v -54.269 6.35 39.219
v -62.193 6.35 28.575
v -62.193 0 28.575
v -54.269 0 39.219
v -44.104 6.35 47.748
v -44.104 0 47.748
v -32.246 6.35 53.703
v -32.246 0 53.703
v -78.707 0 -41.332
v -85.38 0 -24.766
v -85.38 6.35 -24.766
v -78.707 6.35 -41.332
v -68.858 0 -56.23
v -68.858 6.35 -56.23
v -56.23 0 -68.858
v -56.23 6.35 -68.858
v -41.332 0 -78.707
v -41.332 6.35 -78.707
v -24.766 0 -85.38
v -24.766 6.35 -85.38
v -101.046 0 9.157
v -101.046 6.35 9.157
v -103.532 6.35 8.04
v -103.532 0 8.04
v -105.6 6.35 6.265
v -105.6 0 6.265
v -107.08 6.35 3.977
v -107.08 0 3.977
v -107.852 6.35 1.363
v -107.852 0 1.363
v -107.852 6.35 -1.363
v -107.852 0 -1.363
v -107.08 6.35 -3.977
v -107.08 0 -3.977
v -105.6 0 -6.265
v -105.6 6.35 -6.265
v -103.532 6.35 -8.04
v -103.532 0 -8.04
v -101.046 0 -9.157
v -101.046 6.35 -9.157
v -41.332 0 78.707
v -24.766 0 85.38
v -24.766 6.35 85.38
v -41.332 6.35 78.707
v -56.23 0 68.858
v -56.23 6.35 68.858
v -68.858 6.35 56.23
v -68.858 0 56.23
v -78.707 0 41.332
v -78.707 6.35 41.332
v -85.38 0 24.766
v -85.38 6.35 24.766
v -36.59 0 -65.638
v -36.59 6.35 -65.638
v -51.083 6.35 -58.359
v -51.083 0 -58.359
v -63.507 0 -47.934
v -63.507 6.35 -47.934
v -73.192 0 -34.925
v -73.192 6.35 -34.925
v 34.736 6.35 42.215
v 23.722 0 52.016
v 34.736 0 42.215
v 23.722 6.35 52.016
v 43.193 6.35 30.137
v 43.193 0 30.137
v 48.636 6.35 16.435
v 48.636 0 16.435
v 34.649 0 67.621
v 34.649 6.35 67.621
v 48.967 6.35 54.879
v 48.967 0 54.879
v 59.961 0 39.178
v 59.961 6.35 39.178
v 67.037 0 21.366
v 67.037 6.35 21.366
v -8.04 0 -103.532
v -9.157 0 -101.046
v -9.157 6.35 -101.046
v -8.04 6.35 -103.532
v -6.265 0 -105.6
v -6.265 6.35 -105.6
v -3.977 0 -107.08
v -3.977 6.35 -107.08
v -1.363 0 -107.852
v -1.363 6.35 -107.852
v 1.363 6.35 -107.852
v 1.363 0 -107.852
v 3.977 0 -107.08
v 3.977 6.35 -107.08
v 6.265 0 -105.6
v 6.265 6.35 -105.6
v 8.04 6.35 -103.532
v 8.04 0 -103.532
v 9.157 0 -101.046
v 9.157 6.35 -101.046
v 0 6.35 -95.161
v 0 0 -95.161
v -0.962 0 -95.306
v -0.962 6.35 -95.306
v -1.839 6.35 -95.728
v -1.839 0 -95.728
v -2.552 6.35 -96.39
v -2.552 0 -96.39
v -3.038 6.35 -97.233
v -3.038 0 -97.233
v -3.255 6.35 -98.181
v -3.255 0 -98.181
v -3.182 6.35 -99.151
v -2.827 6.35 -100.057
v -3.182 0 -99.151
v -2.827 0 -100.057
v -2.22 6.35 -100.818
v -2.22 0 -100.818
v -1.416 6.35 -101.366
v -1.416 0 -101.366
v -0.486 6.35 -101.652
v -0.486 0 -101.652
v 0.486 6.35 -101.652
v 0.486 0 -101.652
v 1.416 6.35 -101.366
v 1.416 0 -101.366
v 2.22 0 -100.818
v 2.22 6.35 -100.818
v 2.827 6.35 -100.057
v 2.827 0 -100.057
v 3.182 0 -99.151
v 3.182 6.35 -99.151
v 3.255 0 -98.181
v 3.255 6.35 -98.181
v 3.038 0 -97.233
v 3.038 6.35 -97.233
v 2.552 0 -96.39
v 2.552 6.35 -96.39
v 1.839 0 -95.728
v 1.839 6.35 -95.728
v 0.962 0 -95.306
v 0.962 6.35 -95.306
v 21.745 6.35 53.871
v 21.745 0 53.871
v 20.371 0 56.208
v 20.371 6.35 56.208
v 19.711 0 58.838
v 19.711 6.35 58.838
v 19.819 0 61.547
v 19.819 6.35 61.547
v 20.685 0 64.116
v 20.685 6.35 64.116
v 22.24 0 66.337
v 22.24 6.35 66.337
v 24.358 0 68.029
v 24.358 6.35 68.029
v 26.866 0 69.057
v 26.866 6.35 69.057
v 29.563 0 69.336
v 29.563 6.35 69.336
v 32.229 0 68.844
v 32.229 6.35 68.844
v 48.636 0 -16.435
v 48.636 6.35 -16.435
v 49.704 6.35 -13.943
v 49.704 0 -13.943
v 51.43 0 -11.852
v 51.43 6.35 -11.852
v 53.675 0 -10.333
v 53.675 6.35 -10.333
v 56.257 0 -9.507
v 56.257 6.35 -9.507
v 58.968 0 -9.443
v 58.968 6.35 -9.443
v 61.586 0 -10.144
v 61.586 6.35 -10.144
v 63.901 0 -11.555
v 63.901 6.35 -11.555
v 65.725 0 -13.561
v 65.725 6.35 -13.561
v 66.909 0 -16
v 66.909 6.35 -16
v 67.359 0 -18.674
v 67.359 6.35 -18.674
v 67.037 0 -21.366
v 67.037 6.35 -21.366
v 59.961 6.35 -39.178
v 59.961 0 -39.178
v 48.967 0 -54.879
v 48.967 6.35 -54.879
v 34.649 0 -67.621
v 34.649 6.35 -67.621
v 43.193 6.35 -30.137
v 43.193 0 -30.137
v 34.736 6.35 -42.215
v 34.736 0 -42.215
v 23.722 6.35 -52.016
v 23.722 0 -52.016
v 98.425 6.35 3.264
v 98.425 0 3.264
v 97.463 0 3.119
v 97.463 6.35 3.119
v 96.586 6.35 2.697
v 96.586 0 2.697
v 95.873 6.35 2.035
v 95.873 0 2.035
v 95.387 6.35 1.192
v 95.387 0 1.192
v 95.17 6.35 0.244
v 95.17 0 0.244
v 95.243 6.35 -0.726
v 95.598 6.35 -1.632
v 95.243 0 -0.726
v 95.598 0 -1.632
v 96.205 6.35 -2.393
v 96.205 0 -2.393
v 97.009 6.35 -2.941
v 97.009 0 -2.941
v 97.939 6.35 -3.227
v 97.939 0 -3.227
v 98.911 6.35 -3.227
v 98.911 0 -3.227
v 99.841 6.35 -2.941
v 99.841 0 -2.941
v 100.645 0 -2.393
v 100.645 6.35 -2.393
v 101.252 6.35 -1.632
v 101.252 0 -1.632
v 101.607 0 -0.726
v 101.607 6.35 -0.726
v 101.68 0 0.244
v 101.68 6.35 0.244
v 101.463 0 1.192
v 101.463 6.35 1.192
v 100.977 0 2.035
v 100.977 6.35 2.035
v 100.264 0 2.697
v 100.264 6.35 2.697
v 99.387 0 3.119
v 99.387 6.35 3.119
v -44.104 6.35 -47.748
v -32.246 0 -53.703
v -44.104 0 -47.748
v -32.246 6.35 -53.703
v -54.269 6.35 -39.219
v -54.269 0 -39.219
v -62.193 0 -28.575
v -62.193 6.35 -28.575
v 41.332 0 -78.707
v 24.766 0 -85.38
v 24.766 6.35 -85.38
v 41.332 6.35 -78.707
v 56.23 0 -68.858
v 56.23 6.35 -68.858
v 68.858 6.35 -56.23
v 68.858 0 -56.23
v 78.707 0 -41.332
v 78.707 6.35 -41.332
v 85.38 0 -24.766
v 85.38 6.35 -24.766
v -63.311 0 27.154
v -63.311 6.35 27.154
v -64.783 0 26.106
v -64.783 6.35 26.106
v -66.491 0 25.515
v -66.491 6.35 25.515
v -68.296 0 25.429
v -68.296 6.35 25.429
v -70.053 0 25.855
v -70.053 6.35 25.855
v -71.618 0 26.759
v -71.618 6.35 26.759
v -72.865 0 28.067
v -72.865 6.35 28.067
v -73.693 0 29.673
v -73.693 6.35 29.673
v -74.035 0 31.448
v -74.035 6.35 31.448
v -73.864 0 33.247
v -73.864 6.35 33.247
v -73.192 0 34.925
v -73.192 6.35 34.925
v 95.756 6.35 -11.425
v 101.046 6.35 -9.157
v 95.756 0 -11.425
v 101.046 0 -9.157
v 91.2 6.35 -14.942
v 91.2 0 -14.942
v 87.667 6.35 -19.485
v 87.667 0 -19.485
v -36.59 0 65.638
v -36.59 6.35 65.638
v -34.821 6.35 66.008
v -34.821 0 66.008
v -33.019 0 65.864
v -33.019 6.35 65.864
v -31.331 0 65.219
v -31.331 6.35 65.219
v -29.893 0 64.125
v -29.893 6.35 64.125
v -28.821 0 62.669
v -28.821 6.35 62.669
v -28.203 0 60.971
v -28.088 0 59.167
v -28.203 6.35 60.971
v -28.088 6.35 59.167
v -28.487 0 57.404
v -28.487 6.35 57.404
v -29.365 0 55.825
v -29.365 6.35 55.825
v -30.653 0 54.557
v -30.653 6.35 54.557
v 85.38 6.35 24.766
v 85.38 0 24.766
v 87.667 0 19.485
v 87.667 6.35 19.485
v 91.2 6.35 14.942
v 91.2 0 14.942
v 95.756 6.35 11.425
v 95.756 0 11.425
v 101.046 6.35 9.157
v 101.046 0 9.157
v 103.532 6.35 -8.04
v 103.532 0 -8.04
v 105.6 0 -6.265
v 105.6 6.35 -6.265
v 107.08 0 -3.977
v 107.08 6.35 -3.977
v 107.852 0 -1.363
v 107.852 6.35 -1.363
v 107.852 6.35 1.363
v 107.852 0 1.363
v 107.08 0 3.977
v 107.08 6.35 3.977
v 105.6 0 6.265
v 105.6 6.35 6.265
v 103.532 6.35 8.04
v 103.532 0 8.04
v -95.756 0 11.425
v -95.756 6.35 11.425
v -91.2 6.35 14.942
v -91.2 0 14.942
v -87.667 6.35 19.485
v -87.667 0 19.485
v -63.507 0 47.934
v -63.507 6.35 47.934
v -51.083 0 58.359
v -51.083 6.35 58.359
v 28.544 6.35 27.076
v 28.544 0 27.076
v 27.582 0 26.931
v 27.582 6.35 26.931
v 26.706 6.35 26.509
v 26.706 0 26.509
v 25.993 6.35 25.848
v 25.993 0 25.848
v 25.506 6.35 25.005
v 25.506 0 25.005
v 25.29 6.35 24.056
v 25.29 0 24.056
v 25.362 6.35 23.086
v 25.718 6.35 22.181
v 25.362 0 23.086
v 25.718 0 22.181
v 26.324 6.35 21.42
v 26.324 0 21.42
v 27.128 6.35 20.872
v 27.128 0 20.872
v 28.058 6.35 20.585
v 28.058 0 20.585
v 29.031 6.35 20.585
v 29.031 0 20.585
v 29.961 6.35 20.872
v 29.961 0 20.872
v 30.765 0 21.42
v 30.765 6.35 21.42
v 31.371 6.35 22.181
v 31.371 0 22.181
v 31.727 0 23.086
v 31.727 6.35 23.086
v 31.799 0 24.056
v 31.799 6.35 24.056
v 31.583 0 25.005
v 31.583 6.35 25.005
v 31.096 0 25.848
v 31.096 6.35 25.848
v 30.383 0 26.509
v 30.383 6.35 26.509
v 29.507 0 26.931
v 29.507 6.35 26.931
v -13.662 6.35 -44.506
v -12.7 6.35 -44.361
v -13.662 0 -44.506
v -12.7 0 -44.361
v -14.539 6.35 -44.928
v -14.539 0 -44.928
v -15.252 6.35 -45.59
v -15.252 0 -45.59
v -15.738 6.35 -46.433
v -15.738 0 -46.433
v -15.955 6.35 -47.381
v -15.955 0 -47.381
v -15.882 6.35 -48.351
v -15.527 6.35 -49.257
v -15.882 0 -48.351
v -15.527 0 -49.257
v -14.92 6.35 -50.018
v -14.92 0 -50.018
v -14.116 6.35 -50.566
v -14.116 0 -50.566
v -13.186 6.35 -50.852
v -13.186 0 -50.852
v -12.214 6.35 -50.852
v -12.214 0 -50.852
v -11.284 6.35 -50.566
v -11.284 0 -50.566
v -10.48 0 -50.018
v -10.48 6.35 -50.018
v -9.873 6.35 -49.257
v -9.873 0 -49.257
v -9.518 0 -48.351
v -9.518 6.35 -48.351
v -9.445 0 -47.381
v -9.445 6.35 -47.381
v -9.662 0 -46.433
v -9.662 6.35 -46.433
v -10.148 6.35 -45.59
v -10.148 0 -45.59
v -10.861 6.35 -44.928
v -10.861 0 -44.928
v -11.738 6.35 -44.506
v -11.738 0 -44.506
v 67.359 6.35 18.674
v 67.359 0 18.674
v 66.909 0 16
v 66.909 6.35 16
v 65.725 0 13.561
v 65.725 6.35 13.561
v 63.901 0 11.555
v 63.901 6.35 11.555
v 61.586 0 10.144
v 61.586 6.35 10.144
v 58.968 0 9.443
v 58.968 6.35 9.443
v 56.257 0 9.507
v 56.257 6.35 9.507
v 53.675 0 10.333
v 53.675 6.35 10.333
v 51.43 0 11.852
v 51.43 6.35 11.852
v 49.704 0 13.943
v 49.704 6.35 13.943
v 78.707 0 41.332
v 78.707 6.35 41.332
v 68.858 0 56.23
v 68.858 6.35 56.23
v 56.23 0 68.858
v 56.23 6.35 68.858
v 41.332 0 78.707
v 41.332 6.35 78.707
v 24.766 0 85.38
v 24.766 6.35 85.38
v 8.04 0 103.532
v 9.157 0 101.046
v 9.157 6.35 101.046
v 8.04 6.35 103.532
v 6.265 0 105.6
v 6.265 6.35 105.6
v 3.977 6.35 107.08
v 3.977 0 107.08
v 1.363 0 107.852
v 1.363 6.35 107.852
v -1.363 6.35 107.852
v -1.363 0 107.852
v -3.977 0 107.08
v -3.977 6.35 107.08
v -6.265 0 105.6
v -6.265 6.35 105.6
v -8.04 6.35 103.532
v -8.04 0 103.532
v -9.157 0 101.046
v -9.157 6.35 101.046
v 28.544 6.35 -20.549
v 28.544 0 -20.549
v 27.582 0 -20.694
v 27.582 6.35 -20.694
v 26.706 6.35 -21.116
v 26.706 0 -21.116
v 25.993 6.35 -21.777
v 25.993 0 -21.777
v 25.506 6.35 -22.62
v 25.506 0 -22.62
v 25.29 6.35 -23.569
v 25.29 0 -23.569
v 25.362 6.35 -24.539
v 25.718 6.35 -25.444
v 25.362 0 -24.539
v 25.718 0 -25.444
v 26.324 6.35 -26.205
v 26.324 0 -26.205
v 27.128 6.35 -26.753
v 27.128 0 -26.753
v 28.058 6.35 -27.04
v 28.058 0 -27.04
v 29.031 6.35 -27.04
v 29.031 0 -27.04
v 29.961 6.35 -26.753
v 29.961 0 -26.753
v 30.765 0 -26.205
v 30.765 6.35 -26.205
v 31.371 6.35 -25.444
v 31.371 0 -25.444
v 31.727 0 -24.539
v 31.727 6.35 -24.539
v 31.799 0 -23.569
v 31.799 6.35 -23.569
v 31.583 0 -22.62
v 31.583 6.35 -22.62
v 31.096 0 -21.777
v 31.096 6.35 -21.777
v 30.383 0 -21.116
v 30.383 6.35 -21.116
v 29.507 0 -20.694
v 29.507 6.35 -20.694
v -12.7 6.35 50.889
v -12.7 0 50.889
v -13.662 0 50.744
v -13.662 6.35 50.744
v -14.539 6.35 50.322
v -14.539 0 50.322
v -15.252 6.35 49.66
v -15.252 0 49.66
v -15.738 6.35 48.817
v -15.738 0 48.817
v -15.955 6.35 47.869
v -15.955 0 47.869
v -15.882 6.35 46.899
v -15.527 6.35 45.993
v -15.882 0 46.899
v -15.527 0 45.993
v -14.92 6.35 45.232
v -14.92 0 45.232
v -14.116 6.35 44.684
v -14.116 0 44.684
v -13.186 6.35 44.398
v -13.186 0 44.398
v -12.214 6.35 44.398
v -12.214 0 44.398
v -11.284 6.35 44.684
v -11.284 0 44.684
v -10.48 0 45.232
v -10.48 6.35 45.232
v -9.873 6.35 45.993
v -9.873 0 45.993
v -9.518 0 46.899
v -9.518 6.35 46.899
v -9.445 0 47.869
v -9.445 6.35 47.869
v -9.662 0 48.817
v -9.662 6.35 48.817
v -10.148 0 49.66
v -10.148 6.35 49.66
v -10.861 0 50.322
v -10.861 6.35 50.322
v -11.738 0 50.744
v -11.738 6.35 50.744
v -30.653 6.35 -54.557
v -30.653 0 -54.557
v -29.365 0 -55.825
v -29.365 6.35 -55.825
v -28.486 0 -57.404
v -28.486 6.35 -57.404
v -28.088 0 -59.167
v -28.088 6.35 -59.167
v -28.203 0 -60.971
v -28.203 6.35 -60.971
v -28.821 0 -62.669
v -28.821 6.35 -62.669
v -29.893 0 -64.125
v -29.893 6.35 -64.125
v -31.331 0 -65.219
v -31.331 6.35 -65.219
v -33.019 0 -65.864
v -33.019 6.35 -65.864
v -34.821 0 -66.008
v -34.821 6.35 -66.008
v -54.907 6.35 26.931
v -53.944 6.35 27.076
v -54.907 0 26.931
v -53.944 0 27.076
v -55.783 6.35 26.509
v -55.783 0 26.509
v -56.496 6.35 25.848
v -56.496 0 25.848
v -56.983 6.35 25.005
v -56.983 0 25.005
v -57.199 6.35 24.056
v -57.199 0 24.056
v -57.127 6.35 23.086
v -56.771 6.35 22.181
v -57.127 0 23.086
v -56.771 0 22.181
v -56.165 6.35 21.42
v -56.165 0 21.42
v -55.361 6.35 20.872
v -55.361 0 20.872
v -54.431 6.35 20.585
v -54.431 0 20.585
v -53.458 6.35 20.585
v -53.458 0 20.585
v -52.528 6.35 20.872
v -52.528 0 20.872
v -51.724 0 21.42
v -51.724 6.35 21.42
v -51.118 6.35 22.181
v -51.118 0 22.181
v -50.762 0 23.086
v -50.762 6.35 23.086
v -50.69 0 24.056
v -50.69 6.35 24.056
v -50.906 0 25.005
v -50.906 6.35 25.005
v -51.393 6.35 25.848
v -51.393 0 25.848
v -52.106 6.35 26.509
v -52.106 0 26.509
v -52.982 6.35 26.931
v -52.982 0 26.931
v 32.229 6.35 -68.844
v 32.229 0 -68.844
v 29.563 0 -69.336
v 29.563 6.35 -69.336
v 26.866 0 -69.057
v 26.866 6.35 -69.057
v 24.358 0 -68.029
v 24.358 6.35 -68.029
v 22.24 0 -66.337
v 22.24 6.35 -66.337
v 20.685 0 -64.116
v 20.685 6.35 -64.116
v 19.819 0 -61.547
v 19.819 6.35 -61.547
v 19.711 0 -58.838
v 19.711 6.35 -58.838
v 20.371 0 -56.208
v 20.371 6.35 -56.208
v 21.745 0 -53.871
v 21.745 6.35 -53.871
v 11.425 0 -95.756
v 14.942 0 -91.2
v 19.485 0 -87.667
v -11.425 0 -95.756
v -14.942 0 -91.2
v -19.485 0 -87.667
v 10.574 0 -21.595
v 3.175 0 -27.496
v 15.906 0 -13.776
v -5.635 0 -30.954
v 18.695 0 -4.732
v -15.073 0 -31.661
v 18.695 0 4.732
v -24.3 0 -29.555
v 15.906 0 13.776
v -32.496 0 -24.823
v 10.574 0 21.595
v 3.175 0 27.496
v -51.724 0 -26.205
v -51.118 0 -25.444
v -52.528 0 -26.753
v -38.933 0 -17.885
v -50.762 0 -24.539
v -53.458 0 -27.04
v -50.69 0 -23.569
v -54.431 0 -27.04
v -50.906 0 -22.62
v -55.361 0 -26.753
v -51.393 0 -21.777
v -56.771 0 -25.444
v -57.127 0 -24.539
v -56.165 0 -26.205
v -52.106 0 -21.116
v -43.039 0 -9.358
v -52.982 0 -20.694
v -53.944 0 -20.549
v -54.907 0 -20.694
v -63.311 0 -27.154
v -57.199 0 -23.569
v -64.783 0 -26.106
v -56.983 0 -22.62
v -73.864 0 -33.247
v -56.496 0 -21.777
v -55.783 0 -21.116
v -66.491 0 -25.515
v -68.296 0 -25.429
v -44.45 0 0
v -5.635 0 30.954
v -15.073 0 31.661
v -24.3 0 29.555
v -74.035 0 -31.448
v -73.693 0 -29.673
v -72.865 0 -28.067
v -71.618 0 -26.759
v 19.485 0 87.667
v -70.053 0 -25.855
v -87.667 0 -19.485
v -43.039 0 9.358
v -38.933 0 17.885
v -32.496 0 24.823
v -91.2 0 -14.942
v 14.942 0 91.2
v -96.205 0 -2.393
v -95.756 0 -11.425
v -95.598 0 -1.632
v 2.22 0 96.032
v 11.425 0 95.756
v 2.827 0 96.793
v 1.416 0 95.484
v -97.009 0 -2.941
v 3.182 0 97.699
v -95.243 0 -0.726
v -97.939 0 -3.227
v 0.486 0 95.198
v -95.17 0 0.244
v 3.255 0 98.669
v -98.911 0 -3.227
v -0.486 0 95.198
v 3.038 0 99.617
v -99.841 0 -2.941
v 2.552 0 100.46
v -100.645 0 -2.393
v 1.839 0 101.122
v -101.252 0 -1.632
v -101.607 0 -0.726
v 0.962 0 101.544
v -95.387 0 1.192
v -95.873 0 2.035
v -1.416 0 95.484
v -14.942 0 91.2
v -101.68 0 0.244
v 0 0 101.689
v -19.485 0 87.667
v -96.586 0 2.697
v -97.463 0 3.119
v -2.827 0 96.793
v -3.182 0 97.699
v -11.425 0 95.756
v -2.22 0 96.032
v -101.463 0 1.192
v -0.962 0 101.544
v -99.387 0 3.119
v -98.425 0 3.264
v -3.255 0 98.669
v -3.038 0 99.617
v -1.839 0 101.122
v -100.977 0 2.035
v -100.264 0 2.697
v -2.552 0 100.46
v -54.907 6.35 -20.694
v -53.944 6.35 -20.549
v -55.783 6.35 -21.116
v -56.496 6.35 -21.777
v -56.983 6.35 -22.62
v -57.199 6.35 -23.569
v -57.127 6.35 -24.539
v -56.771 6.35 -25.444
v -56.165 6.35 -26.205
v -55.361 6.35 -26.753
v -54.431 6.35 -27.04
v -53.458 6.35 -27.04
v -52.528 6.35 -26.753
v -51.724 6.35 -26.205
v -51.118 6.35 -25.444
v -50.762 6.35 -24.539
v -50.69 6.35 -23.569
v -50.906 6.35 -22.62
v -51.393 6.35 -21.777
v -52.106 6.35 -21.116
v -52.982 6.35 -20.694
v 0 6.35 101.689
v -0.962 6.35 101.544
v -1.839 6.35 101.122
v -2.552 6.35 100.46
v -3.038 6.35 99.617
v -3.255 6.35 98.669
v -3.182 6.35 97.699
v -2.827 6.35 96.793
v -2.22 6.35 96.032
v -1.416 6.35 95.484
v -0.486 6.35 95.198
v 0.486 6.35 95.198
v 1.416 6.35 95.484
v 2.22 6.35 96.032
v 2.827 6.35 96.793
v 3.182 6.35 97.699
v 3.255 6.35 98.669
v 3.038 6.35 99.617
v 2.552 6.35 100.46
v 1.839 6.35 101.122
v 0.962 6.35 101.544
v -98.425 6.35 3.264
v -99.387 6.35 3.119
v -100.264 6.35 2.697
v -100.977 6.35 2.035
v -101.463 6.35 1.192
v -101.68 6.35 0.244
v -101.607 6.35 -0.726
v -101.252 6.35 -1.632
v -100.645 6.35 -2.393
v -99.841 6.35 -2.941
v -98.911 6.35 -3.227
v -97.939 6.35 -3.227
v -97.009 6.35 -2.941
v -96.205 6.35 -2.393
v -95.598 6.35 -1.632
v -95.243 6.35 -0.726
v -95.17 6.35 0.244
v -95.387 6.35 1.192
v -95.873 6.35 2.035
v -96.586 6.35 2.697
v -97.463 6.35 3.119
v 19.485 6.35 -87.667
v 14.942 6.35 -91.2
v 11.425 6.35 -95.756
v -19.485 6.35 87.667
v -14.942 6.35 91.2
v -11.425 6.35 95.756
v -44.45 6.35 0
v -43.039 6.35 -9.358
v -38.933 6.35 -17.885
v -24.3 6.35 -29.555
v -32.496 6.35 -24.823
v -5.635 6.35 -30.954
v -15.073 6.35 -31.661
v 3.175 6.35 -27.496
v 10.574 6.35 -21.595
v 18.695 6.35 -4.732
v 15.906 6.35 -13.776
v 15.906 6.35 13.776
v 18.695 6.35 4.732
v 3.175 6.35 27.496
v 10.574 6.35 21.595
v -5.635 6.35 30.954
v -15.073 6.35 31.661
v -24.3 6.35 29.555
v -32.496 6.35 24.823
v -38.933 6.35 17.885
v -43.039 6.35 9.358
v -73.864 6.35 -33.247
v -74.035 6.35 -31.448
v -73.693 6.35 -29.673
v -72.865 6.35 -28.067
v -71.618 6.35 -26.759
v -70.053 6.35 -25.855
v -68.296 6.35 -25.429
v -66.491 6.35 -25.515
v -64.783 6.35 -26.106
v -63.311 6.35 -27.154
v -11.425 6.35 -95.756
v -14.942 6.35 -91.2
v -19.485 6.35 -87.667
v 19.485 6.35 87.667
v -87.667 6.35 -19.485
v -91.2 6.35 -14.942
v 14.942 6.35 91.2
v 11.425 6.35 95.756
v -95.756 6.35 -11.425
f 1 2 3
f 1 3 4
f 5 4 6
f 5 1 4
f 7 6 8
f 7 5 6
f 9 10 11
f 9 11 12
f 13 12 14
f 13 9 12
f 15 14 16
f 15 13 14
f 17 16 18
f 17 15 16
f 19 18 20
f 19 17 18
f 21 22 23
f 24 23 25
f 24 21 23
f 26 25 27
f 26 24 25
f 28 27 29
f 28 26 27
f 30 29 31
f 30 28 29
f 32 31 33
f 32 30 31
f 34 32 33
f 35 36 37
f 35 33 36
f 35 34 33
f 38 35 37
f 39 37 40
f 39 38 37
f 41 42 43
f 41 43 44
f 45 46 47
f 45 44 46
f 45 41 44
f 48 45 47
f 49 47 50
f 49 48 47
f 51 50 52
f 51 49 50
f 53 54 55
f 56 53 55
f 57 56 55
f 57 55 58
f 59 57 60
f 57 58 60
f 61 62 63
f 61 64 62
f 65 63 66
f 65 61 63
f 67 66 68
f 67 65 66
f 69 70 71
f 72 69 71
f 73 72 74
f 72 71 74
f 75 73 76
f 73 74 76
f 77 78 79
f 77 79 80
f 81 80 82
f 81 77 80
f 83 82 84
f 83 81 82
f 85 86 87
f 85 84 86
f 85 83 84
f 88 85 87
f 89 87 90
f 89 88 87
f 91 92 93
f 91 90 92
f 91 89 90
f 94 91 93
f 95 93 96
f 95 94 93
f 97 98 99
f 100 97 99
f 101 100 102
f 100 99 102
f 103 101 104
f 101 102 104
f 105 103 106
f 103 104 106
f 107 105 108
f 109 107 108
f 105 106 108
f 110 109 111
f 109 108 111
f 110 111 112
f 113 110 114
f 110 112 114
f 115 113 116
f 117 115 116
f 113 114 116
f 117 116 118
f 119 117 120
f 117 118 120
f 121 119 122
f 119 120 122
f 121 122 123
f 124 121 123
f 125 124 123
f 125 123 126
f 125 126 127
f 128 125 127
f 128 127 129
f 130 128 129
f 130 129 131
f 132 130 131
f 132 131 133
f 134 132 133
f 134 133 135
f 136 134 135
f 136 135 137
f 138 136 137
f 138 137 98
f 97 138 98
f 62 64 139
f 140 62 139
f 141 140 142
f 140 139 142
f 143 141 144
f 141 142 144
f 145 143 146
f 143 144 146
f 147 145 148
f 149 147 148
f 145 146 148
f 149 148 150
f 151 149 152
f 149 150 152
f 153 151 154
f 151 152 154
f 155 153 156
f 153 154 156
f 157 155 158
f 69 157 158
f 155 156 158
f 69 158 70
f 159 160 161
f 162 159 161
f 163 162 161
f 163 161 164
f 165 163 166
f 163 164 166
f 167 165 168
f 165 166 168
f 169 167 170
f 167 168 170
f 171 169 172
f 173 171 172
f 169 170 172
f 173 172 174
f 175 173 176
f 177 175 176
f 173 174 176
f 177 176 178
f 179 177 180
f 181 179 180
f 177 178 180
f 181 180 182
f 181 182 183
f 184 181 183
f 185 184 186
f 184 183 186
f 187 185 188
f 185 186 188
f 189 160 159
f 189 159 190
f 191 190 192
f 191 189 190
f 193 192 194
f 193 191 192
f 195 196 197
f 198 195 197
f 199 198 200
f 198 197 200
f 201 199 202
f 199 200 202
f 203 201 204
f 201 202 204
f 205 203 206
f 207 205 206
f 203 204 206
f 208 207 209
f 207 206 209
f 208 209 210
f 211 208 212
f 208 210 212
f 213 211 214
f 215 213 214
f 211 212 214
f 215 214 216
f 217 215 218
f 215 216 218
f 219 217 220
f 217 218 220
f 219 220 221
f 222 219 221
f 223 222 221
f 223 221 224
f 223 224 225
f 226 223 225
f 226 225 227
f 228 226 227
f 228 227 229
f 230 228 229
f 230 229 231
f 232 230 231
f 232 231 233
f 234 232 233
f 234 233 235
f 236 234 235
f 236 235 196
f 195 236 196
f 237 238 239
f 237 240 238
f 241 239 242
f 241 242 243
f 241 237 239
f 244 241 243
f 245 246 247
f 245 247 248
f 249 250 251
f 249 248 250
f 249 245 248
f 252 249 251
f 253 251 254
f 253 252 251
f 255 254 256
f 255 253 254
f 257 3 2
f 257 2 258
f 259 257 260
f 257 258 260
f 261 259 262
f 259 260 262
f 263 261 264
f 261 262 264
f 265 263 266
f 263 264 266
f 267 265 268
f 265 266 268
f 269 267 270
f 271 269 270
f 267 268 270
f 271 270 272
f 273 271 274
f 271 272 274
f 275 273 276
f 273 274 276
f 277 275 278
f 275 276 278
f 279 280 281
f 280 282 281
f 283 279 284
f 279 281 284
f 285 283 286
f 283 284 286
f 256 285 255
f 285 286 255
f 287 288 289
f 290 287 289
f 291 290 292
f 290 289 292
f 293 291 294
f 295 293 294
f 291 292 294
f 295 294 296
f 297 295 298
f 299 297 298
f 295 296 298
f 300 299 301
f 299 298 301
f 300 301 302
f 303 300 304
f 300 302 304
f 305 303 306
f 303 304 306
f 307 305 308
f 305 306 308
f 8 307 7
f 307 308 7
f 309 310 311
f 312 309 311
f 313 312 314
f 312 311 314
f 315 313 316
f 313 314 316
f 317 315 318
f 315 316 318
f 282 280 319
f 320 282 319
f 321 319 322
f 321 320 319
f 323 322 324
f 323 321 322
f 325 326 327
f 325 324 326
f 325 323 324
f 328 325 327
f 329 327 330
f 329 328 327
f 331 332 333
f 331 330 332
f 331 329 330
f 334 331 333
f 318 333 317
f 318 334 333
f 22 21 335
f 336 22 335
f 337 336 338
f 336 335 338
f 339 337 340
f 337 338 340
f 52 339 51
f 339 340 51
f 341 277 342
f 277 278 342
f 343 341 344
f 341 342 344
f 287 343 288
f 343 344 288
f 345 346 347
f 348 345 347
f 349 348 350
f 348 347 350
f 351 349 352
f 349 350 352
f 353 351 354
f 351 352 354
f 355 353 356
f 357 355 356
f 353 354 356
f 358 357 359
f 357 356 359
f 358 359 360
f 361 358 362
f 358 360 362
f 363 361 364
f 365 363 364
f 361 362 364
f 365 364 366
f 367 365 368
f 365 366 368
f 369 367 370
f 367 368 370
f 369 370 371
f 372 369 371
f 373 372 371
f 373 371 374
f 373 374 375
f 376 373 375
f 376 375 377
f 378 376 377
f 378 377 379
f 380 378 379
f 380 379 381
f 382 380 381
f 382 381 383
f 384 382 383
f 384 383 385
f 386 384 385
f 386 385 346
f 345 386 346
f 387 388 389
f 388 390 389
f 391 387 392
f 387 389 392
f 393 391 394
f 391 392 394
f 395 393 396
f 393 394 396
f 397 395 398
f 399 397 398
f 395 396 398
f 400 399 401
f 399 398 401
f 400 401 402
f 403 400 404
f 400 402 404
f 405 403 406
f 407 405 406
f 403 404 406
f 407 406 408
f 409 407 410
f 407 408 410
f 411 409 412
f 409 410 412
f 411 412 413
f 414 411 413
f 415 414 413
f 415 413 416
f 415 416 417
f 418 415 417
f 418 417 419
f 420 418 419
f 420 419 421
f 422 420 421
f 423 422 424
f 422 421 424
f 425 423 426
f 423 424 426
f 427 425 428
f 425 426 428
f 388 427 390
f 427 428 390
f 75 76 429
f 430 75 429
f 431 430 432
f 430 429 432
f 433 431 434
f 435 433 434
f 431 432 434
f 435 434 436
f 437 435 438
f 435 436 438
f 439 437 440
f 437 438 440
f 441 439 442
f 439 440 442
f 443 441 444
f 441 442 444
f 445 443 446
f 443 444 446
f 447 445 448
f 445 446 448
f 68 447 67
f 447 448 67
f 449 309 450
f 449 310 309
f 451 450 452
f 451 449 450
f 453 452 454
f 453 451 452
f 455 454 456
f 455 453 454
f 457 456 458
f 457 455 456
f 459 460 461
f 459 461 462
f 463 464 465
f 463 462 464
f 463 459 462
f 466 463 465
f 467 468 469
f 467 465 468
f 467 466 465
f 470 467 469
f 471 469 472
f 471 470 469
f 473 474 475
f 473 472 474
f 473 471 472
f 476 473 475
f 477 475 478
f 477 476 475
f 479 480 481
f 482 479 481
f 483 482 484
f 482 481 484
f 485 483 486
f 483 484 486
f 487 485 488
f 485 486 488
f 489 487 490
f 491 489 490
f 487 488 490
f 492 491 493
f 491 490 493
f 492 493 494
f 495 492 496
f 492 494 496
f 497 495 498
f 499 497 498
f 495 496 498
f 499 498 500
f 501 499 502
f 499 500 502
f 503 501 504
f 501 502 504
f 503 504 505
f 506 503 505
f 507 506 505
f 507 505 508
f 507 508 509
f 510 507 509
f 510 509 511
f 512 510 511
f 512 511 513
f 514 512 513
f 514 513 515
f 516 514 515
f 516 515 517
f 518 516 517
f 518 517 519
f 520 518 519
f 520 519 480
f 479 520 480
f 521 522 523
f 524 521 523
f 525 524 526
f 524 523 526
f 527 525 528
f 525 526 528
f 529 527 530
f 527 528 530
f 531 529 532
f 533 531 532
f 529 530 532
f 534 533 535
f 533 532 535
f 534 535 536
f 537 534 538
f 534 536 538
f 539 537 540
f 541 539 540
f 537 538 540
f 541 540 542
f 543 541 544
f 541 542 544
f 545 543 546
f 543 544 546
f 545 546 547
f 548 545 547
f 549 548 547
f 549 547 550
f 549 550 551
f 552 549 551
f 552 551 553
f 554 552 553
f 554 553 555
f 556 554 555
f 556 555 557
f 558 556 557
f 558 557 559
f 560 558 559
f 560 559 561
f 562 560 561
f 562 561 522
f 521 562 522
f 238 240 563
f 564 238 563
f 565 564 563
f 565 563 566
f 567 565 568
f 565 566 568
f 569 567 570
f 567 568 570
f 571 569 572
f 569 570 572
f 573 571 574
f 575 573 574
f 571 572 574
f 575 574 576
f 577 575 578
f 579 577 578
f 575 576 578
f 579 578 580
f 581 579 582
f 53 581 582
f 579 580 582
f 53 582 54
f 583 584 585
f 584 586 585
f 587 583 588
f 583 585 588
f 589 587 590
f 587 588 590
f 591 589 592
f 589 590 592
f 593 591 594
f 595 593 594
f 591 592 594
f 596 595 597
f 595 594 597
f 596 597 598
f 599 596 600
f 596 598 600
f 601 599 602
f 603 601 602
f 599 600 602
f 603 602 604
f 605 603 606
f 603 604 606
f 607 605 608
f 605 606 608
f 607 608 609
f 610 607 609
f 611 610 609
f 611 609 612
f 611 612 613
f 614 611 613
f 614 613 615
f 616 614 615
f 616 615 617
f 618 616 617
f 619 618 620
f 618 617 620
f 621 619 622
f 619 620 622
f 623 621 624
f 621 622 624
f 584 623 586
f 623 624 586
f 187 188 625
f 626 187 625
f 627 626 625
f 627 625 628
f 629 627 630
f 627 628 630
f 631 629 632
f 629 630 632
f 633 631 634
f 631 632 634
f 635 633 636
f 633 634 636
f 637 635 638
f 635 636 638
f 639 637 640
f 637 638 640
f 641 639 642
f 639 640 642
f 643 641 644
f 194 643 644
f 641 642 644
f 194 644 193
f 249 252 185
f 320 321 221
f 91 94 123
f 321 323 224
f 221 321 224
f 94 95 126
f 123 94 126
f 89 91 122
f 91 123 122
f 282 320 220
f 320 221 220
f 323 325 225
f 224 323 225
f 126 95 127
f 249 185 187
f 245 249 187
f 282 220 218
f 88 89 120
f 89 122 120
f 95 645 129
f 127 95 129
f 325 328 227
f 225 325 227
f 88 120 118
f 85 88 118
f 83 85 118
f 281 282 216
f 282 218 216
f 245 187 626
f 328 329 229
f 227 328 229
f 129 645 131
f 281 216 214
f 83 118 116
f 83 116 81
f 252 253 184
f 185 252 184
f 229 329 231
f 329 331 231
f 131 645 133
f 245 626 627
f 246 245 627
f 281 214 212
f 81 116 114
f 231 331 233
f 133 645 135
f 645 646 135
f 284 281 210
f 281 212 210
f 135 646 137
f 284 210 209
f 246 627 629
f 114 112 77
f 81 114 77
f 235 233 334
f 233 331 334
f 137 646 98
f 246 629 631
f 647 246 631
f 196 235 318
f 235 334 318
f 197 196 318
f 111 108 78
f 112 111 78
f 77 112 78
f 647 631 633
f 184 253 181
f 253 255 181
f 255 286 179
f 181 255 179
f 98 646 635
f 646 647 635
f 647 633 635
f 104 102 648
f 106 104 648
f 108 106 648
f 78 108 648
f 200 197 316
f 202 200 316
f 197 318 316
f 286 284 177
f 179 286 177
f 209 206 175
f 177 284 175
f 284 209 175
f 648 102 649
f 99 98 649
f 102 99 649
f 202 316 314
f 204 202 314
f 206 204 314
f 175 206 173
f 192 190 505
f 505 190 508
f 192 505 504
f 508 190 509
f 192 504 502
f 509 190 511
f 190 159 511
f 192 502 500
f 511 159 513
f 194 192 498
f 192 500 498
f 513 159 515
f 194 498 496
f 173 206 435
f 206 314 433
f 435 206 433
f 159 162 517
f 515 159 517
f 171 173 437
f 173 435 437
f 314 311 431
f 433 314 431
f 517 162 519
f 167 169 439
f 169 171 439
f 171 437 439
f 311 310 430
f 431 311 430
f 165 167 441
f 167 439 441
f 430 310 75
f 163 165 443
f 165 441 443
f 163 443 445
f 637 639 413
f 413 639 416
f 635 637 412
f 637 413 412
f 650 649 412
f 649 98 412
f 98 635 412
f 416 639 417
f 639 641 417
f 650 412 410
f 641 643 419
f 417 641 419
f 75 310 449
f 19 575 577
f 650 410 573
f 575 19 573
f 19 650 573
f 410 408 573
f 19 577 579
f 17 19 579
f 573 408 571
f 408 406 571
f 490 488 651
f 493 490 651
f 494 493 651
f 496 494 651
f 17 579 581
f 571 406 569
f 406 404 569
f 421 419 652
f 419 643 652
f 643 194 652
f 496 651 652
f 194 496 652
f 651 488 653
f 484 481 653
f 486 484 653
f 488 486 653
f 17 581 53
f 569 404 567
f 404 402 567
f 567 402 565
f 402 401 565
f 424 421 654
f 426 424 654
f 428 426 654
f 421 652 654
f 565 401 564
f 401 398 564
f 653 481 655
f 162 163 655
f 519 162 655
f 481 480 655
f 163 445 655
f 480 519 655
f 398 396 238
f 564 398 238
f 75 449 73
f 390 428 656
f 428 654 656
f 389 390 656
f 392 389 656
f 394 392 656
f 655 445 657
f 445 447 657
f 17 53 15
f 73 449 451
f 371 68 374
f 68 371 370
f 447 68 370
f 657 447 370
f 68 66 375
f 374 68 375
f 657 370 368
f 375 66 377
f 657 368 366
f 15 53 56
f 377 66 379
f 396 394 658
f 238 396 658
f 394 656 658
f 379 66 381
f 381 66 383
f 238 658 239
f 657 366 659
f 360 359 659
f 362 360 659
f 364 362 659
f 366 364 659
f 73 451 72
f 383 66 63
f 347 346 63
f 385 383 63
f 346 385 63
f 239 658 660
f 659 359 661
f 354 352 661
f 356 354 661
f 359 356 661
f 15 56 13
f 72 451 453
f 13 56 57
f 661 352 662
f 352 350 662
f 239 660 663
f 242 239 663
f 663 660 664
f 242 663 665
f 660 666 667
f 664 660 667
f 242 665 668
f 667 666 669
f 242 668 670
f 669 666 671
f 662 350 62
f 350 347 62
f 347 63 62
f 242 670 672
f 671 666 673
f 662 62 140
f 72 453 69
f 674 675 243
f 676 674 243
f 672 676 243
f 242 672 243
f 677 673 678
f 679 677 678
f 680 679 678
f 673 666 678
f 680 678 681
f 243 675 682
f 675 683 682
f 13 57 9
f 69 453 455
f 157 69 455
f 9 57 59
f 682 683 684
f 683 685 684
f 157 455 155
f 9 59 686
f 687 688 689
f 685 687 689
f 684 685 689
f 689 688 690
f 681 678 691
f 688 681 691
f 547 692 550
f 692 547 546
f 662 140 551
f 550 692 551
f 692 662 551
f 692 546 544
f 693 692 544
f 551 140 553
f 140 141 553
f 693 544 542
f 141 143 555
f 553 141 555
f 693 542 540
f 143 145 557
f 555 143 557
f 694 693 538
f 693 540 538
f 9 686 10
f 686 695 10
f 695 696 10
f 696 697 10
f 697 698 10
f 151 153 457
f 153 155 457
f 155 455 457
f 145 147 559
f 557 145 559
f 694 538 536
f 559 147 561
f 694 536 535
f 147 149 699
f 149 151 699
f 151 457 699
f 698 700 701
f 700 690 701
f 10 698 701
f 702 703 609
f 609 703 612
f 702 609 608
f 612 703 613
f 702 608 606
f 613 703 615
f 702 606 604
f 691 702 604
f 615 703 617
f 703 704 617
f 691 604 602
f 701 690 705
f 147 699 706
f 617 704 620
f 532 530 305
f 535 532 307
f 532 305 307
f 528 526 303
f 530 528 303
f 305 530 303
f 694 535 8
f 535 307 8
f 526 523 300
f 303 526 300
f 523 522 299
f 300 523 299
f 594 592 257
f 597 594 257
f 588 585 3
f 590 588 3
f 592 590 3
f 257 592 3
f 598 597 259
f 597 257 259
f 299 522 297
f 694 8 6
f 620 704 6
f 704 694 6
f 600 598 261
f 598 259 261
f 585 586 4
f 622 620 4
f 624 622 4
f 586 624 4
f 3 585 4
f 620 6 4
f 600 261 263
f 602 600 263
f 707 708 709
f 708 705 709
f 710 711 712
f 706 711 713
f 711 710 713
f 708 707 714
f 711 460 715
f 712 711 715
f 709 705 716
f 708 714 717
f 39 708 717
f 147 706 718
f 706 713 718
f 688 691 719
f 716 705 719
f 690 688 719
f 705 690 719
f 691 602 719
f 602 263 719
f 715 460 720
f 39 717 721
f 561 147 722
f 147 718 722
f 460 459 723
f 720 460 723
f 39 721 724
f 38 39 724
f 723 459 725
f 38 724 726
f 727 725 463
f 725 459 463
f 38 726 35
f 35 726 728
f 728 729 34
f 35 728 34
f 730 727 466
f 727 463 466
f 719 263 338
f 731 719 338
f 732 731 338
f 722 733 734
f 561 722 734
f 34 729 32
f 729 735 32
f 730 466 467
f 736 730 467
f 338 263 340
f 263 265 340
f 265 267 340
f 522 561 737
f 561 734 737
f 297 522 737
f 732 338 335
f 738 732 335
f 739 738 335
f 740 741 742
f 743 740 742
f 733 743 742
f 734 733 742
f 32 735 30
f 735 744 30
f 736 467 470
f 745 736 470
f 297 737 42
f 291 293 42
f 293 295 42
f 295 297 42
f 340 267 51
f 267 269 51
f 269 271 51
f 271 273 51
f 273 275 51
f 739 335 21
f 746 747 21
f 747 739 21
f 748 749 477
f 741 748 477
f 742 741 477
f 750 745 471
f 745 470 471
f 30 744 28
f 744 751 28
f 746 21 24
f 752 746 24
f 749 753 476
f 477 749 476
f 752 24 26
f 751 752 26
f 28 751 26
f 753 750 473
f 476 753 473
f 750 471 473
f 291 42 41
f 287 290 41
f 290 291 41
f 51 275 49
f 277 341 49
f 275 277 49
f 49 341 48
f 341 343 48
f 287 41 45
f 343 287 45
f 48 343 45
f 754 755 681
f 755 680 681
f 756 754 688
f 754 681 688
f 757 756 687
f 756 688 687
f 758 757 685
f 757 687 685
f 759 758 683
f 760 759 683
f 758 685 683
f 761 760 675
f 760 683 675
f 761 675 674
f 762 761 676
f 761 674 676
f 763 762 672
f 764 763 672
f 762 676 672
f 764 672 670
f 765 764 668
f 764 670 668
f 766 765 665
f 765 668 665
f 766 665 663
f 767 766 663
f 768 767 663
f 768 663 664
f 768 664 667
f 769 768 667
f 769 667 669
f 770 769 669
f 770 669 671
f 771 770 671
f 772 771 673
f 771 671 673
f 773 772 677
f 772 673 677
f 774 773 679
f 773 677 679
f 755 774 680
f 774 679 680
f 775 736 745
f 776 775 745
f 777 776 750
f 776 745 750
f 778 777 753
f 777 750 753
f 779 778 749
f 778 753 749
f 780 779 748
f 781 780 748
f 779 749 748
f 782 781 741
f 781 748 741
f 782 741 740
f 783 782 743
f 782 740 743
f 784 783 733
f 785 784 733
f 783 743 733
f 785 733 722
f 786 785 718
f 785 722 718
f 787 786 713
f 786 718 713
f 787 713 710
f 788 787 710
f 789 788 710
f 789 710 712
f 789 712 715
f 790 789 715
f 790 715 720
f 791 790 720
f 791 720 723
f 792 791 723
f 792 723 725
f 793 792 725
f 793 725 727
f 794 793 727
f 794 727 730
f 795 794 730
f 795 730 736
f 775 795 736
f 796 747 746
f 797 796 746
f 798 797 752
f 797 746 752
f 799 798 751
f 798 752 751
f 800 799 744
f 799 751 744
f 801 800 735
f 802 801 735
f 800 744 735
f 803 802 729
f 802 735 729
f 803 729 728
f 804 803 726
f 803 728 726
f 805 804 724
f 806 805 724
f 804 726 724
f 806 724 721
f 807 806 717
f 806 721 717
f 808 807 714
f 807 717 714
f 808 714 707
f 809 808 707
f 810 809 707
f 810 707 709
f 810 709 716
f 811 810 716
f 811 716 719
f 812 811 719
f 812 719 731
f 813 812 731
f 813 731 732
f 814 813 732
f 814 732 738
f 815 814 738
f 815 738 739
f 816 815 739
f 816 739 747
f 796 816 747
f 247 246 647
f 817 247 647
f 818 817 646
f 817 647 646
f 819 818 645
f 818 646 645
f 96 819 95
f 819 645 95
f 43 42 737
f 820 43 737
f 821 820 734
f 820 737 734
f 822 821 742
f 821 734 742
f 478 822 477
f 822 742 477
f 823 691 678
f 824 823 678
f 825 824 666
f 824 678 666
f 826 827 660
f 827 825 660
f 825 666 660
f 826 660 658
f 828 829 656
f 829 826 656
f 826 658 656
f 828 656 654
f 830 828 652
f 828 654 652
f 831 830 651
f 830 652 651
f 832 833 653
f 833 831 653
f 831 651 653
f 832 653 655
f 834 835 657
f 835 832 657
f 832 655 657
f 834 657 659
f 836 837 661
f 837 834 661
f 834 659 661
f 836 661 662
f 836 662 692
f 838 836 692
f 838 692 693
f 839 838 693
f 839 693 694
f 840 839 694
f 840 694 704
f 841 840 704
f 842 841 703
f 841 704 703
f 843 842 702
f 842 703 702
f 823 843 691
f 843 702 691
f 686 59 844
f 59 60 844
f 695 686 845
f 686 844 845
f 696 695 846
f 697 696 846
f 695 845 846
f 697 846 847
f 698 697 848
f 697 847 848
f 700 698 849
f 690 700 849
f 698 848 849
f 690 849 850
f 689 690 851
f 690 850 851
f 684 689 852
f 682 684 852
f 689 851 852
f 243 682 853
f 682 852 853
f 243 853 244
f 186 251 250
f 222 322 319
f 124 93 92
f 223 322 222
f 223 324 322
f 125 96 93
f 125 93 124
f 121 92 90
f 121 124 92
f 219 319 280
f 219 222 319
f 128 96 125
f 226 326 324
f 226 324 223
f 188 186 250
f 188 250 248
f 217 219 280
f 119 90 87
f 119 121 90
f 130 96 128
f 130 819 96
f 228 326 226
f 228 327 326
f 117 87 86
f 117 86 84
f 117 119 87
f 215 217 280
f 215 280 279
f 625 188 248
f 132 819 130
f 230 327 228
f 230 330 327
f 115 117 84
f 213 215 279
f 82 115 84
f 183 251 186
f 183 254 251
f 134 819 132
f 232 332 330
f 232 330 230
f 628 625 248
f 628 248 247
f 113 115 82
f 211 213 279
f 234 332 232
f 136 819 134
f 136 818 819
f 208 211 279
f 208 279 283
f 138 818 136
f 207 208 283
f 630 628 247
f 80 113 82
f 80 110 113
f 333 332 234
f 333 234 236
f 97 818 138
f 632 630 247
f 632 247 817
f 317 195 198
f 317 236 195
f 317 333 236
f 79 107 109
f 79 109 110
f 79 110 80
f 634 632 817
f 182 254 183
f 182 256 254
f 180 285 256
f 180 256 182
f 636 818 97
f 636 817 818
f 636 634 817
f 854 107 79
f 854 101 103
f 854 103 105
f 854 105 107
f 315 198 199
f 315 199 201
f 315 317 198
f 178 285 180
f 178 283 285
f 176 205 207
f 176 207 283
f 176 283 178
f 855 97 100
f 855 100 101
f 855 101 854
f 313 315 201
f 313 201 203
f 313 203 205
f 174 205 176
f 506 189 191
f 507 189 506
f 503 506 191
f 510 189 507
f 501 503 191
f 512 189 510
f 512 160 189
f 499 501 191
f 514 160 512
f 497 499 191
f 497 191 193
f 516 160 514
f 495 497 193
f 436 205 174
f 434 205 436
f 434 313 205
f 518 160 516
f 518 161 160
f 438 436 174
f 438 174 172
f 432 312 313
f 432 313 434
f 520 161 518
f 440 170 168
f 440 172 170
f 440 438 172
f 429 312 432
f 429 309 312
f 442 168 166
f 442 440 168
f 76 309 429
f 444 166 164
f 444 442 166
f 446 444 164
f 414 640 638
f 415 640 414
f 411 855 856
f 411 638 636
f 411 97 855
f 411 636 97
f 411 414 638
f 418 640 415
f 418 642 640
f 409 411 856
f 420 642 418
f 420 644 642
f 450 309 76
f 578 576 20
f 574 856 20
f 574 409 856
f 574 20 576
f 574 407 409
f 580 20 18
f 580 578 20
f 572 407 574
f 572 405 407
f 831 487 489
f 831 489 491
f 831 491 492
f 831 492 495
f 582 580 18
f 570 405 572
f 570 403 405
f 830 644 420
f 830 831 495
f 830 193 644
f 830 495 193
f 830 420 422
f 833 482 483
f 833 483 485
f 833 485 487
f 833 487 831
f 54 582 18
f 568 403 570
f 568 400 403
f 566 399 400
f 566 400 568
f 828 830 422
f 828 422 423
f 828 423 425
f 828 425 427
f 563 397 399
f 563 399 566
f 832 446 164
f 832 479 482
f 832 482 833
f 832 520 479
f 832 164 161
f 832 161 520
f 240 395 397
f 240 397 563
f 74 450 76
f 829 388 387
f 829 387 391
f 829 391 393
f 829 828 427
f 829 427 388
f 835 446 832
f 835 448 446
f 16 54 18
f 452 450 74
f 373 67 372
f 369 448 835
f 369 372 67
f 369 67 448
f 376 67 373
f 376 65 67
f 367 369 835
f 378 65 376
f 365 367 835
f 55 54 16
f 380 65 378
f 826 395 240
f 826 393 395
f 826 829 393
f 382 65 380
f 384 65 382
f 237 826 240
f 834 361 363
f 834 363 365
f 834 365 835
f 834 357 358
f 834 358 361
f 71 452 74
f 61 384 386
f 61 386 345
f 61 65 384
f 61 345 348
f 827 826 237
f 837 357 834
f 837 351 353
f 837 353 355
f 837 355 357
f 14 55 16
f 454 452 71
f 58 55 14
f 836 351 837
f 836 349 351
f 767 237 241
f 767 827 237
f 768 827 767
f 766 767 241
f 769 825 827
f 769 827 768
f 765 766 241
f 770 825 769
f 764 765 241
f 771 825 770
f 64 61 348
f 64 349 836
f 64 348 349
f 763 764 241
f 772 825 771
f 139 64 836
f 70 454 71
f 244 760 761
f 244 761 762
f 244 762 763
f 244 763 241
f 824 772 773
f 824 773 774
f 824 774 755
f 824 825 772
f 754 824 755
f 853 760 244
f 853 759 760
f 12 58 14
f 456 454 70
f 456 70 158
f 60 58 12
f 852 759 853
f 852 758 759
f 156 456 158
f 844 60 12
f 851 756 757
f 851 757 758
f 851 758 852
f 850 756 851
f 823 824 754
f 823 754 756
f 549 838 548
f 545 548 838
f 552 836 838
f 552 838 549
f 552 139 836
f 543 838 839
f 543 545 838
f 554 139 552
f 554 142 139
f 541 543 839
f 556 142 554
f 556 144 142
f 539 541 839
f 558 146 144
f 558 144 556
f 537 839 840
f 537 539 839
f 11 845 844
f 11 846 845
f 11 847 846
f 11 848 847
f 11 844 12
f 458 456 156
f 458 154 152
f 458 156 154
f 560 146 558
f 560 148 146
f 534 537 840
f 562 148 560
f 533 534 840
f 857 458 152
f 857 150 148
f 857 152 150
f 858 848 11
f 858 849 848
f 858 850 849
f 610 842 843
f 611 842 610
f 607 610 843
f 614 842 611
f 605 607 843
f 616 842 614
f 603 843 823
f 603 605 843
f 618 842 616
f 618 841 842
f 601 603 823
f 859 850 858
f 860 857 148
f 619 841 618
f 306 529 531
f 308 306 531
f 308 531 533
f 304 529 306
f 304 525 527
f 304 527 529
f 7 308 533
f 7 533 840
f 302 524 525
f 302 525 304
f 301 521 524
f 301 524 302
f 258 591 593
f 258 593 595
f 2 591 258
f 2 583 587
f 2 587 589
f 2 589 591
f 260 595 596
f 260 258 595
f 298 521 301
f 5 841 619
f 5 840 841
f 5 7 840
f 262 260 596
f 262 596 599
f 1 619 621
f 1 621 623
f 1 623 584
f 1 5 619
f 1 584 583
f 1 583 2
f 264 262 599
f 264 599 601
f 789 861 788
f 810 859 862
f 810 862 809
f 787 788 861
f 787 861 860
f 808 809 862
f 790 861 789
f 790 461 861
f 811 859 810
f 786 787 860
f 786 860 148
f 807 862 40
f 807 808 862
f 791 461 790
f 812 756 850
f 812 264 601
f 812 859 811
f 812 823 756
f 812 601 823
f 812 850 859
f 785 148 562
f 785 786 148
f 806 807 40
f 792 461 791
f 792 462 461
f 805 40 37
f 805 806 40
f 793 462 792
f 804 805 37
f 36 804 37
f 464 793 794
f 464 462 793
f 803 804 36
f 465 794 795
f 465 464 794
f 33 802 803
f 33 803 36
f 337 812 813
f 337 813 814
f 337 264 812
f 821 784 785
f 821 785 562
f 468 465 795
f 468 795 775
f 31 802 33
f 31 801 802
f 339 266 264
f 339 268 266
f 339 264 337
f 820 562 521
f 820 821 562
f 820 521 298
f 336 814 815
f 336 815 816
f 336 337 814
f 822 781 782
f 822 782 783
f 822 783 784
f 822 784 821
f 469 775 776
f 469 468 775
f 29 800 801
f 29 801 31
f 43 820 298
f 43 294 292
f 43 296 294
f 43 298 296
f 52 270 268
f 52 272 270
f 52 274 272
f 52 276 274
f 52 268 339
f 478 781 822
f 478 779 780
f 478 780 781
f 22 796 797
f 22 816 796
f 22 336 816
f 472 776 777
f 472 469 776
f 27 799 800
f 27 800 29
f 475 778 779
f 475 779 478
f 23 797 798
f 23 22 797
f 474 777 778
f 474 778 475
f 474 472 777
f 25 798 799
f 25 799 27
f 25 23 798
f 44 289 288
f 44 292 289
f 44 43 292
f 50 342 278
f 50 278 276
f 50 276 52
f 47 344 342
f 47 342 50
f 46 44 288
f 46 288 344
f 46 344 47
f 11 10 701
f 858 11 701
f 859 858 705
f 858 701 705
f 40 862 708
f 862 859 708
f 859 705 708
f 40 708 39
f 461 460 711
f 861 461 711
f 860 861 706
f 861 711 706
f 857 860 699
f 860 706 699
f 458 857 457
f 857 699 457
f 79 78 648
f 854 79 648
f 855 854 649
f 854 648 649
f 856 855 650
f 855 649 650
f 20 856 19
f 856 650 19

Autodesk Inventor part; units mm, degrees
ref_plane "YZ Plane" through (0, 0, 0) normal (1, 0, 0) x (0, 1, 0)
ref_plane "XZ Plane" through (0, 0, 0) normal (0, 1, 0) x (-1, 0, 0)
ref_plane "XY Plane" through (0, 0, 0) normal (0, 0, 1) x (1, 0, 0)
sketch "Sketch1" plane through (0, 0, 0) normal (0, 1, 0) x (-1, 0, 0)
  circle A0 centre (12.7, 0) radius 31.75
  circle A1 centre (0, 0) radius 88.9
  circle A2 centre (0, 98.425) radius 9.525
  arc A3 (9.1574, 101.0457) -> (24.7665, 85.3805) centre (31.1351, 107.3355) ccw
  arc A4 (-24.7665, 85.3805) -> (-9.1574, 101.0457) centre (-31.1351, 107.3355) ccw
  circle A5 centre (-98.425, 0) radius 9.525
  circle A6 centre (0, -98.425) radius 9.525
  circle A7 centre (98.425, 0) radius 9.525
  arc A8 (85.3805, 24.7665) -> (101.0457, 9.1574) centre (107.3355, 31.1351) ccw
  arc A9 (24.7665, -85.3805) -> (9.1574, -101.0457) centre (31.1351, -107.3355) ccw
  arc A10 (-9.1574, -101.0457) -> (-24.7665, -85.3805) centre (-31.1351, -107.3355) ccw
  arc A11 (-85.3805, -24.7665) -> (-101.0457, -9.1574) centre (-107.3355, -31.1351) ccw
  arc A12 (-101.0457, 9.1574) -> (-85.3805, 24.7665) centre (-107.3355, 31.1351) ccw
  arc A13 (101.0457, -9.1574) -> (85.3805, -24.7665) centre (107.3355, -31.1351) ccw
  line L0 (98.425, 0) -> (88.9, 0)
  line L1 (0, 98.425) -> (0, 88.9)
  line L2 (0, -98.425) -> (0, -88.9)
  line L3 (-98.425, 0) -> (-88.9, 0)
  line L4 (12.7, 0) -> (0, 0)
  dimension "d20" = 177.8
  dimension "d0" = 63.5
  dimension "d2" = 19.05
  dimension "d3" = 22.86
  dimension "d21" = 12.7
extrude "Extrusion1" add sketch "Sketch1" along normal blind 6.35
sketch "Sketch3" plane through (0, 6.35, 0) normal (0, 1, 0) x (1, 0, 0)
  circle A0 centre (-12.7, 0) radius 31.75 projected
  arc A1 (101.0457, -9.1574) -> (101.0457, 9.1574) centre (98.425, 0) ccw projected
  arc A2 (101.0457, -9.1574) -> (85.3805, -24.7665) centre (107.3355, -31.1351) ccw projected
  arc A3 (24.7665, -85.3805) -> (85.3805, -24.7665) centre (0, 0) ccw projected
  arc A4 (24.7665, -85.3805) -> (9.1574, -101.0457) centre (31.1351, -107.3355) ccw projected
  arc A5 (-9.1574, -101.0457) -> (9.1574, -101.0457) centre (0, -98.425) ccw projected
  arc A6 (-9.1574, -101.0457) -> (-24.7665, -85.3805) centre (-31.1351, -107.3355) ccw projected
  arc A7 (-85.3805, -24.7665) -> (-24.7665, -85.3805) centre (0, 0) ccw projected
  arc A8 (-85.3805, -24.7665) -> (-101.0457, -9.1574) centre (-107.3355, -31.1351) ccw projected
  arc A9 (-101.0457, 9.1574) -> (-101.0457, -9.1574) centre (-98.425, 0) ccw projected
  arc A10 (-101.0457, 9.1574) -> (-85.3805, 24.7665) centre (-107.3355, 31.1351) ccw projected
  arc A11 (-24.7665, 85.3805) -> (-85.3805, 24.7665) centre (0, 0) ccw projected
  arc A12 (-24.7665, 85.3805) -> (-9.1574, 101.0457) centre (-31.1351, 107.3355) ccw projected
  arc A13 (9.1574, 101.0457) -> (-9.1574, 101.0457) centre (0, 98.425) ccw projected
  arc A14 (9.1574, 101.0457) -> (24.7665, 85.3805) centre (31.1351, 107.3355) ccw projected
  arc A15 (85.3805, 24.7665) -> (24.7665, 85.3805) centre (0, 0) ccw projected
  arc A16 (85.3805, 24.7665) -> (101.0457, 9.1574) centre (107.3355, 31.1351) ccw projected
hole "Hole1" at (98.425, 6.35, 0) at (0, 6.35, 98.425) at (-98.425, 6.35, 0) at (0, 6.35, -98.425) direction (0, -1, 0) diameter 6.5278 depth 12.2936 tip angle 118 clearance for "Socket Head Cap Screw" size "1/4" standard "Ansi Unified Screw Threads"
sketch "Sketch8" plane through (0, 6.35, 0) normal (0, 1, 0) x (1, 0, 0)
  circle A0 centre (-12.7, 0) radius 31.75 projected
  circle A1 centre (-12.7, 0) radius 47.625
  line L0 (-12.7, 0) -> (-12.7, 47.625)
  point P0 (0, 0)
  point P1 (-53.9445, 23.8125)
  point P2 (-53.9445, -23.8125)
  point P3 (-12.7, -47.625)
  point P4 (28.5445, -23.8125)
  point P5 (28.5445, 23.8125)
  dimension "d38" = 95.25
  dimension "d41" = 360
hole "Hole3" at (-12.7, 6.35, -47.625) at (-53.9445, 6.35, -23.8125) at (-53.9445, 6.35, 23.8125) at (-12.7, 6.35, 47.625) at (28.5445, 6.35, 23.8125) at (28.5445, 6.35, -23.8125) direction (0, -1, 0) diameter 6.5278 end through all clearance for "Socket Head Cap Screw" size "1/4" standard "Ansi Unified Screw Threads"
sketch "Sketch9" plane through (0, 6.35, 0) normal (0, 1, 0) x (1, 0, 0)
  circle A0 centre (-12.7, 0) radius 31.75 projected
  circle A1 centre (-12.7, 0) radius 63.5
  circle A2 centre (-12.7, 0) radius 82.55
  arc A3 (34.6487, 67.621) -> (23.7221, 52.0162) centre (29.1854, 59.8186) ccw
  arc A4 (23.7221, -52.0162) -> (34.6487, -67.621) centre (29.1854, -59.8186) ccw
  line L0 (0, 0) -> (50.8, 0)
  line L1 (-12.7, 0) -> (29.1854, 59.8186)
  line L2 (29.1854, -59.8186) -> (-12.7, 0)
  arc A5 (67.0372, -21.3655) -> (48.6363, -16.435) centre (57.8367, -18.9003) ccw
  arc A6 (48.6363, 16.435) -> (67.0372, 21.3655) centre (57.8367, 18.9003) ccw
  line L3 (-12.7, 0) -> (57.8367, 18.9003)
  line L4 (-12.7, 0) -> (57.8367, -18.9003)
  dimension "d50" = 31.75
  dimension "d51" = 19.05
  dimension "d52" = 55
  dimension "d53" = 55
  dimension "d54" = 40
  dimension "d55" = 40
extrude "Extrusion3" cut sketch "Sketch9" against normal blind 25.4 contours A1 A3 A2 A6 | A5 A2 A4 A1
sketch "Sketch10" plane through (0, 6.35, 0) normal (0, 1, 0) x (1, 0, 0)
  circle A0 centre (-98.425, 0) radius 3.2639
  line L0 (-12.7, 0) -> (-98.425, 0)
  arc A1 (-32.2465, 53.7034) -> (-62.1934, 28.575) centre (-12.7, 0) ccw
  arc A2 (-73.1919, 34.925) -> (-62.1934, 28.575) centre (-67.6926, 31.75) ccw
  arc A3 (-32.2465, 53.7034) -> (-36.5901, 65.6375) centre (-34.4183, 59.6705) ccw
  arc A4 (-36.5901, 65.6375) -> (-73.1919, 34.925) centre (-12.7, 0) ccw
  circle A5 centre (-98.425, 0) radius 3.2639 projected
  circle A6 centre (-12.7, 0) radius 31.75 projected
  arc A7 (-62.1934, -28.575) -> (-32.2465, -53.7034) centre (-12.7, 0) ccw
  arc A8 (-62.1934, -28.575) -> (-73.1919, -34.925) centre (-67.6926, -31.75) ccw
  arc A9 (-36.5901, -65.6375) -> (-32.2465, -53.7034) centre (-34.4183, -59.6705) ccw
  arc A10 (-73.1919, -34.925) -> (-36.5901, -65.6375) centre (-12.7, 0) ccw
  circle A11 centre (-12.7, 0) radius 31.75
  dimension "d58" = 114.3
  dimension "d59" = 12.7
  dimension "d60" = 70
  dimension "d61" = 30
extrude "Extrusion4" cut sketch "Sketch10" against normal blind 25.4 contours A1 A2 A4 A3 | A7 A9 A10 A8
properties part number "LargeBearingPlate" material "Aluminum 6061"
